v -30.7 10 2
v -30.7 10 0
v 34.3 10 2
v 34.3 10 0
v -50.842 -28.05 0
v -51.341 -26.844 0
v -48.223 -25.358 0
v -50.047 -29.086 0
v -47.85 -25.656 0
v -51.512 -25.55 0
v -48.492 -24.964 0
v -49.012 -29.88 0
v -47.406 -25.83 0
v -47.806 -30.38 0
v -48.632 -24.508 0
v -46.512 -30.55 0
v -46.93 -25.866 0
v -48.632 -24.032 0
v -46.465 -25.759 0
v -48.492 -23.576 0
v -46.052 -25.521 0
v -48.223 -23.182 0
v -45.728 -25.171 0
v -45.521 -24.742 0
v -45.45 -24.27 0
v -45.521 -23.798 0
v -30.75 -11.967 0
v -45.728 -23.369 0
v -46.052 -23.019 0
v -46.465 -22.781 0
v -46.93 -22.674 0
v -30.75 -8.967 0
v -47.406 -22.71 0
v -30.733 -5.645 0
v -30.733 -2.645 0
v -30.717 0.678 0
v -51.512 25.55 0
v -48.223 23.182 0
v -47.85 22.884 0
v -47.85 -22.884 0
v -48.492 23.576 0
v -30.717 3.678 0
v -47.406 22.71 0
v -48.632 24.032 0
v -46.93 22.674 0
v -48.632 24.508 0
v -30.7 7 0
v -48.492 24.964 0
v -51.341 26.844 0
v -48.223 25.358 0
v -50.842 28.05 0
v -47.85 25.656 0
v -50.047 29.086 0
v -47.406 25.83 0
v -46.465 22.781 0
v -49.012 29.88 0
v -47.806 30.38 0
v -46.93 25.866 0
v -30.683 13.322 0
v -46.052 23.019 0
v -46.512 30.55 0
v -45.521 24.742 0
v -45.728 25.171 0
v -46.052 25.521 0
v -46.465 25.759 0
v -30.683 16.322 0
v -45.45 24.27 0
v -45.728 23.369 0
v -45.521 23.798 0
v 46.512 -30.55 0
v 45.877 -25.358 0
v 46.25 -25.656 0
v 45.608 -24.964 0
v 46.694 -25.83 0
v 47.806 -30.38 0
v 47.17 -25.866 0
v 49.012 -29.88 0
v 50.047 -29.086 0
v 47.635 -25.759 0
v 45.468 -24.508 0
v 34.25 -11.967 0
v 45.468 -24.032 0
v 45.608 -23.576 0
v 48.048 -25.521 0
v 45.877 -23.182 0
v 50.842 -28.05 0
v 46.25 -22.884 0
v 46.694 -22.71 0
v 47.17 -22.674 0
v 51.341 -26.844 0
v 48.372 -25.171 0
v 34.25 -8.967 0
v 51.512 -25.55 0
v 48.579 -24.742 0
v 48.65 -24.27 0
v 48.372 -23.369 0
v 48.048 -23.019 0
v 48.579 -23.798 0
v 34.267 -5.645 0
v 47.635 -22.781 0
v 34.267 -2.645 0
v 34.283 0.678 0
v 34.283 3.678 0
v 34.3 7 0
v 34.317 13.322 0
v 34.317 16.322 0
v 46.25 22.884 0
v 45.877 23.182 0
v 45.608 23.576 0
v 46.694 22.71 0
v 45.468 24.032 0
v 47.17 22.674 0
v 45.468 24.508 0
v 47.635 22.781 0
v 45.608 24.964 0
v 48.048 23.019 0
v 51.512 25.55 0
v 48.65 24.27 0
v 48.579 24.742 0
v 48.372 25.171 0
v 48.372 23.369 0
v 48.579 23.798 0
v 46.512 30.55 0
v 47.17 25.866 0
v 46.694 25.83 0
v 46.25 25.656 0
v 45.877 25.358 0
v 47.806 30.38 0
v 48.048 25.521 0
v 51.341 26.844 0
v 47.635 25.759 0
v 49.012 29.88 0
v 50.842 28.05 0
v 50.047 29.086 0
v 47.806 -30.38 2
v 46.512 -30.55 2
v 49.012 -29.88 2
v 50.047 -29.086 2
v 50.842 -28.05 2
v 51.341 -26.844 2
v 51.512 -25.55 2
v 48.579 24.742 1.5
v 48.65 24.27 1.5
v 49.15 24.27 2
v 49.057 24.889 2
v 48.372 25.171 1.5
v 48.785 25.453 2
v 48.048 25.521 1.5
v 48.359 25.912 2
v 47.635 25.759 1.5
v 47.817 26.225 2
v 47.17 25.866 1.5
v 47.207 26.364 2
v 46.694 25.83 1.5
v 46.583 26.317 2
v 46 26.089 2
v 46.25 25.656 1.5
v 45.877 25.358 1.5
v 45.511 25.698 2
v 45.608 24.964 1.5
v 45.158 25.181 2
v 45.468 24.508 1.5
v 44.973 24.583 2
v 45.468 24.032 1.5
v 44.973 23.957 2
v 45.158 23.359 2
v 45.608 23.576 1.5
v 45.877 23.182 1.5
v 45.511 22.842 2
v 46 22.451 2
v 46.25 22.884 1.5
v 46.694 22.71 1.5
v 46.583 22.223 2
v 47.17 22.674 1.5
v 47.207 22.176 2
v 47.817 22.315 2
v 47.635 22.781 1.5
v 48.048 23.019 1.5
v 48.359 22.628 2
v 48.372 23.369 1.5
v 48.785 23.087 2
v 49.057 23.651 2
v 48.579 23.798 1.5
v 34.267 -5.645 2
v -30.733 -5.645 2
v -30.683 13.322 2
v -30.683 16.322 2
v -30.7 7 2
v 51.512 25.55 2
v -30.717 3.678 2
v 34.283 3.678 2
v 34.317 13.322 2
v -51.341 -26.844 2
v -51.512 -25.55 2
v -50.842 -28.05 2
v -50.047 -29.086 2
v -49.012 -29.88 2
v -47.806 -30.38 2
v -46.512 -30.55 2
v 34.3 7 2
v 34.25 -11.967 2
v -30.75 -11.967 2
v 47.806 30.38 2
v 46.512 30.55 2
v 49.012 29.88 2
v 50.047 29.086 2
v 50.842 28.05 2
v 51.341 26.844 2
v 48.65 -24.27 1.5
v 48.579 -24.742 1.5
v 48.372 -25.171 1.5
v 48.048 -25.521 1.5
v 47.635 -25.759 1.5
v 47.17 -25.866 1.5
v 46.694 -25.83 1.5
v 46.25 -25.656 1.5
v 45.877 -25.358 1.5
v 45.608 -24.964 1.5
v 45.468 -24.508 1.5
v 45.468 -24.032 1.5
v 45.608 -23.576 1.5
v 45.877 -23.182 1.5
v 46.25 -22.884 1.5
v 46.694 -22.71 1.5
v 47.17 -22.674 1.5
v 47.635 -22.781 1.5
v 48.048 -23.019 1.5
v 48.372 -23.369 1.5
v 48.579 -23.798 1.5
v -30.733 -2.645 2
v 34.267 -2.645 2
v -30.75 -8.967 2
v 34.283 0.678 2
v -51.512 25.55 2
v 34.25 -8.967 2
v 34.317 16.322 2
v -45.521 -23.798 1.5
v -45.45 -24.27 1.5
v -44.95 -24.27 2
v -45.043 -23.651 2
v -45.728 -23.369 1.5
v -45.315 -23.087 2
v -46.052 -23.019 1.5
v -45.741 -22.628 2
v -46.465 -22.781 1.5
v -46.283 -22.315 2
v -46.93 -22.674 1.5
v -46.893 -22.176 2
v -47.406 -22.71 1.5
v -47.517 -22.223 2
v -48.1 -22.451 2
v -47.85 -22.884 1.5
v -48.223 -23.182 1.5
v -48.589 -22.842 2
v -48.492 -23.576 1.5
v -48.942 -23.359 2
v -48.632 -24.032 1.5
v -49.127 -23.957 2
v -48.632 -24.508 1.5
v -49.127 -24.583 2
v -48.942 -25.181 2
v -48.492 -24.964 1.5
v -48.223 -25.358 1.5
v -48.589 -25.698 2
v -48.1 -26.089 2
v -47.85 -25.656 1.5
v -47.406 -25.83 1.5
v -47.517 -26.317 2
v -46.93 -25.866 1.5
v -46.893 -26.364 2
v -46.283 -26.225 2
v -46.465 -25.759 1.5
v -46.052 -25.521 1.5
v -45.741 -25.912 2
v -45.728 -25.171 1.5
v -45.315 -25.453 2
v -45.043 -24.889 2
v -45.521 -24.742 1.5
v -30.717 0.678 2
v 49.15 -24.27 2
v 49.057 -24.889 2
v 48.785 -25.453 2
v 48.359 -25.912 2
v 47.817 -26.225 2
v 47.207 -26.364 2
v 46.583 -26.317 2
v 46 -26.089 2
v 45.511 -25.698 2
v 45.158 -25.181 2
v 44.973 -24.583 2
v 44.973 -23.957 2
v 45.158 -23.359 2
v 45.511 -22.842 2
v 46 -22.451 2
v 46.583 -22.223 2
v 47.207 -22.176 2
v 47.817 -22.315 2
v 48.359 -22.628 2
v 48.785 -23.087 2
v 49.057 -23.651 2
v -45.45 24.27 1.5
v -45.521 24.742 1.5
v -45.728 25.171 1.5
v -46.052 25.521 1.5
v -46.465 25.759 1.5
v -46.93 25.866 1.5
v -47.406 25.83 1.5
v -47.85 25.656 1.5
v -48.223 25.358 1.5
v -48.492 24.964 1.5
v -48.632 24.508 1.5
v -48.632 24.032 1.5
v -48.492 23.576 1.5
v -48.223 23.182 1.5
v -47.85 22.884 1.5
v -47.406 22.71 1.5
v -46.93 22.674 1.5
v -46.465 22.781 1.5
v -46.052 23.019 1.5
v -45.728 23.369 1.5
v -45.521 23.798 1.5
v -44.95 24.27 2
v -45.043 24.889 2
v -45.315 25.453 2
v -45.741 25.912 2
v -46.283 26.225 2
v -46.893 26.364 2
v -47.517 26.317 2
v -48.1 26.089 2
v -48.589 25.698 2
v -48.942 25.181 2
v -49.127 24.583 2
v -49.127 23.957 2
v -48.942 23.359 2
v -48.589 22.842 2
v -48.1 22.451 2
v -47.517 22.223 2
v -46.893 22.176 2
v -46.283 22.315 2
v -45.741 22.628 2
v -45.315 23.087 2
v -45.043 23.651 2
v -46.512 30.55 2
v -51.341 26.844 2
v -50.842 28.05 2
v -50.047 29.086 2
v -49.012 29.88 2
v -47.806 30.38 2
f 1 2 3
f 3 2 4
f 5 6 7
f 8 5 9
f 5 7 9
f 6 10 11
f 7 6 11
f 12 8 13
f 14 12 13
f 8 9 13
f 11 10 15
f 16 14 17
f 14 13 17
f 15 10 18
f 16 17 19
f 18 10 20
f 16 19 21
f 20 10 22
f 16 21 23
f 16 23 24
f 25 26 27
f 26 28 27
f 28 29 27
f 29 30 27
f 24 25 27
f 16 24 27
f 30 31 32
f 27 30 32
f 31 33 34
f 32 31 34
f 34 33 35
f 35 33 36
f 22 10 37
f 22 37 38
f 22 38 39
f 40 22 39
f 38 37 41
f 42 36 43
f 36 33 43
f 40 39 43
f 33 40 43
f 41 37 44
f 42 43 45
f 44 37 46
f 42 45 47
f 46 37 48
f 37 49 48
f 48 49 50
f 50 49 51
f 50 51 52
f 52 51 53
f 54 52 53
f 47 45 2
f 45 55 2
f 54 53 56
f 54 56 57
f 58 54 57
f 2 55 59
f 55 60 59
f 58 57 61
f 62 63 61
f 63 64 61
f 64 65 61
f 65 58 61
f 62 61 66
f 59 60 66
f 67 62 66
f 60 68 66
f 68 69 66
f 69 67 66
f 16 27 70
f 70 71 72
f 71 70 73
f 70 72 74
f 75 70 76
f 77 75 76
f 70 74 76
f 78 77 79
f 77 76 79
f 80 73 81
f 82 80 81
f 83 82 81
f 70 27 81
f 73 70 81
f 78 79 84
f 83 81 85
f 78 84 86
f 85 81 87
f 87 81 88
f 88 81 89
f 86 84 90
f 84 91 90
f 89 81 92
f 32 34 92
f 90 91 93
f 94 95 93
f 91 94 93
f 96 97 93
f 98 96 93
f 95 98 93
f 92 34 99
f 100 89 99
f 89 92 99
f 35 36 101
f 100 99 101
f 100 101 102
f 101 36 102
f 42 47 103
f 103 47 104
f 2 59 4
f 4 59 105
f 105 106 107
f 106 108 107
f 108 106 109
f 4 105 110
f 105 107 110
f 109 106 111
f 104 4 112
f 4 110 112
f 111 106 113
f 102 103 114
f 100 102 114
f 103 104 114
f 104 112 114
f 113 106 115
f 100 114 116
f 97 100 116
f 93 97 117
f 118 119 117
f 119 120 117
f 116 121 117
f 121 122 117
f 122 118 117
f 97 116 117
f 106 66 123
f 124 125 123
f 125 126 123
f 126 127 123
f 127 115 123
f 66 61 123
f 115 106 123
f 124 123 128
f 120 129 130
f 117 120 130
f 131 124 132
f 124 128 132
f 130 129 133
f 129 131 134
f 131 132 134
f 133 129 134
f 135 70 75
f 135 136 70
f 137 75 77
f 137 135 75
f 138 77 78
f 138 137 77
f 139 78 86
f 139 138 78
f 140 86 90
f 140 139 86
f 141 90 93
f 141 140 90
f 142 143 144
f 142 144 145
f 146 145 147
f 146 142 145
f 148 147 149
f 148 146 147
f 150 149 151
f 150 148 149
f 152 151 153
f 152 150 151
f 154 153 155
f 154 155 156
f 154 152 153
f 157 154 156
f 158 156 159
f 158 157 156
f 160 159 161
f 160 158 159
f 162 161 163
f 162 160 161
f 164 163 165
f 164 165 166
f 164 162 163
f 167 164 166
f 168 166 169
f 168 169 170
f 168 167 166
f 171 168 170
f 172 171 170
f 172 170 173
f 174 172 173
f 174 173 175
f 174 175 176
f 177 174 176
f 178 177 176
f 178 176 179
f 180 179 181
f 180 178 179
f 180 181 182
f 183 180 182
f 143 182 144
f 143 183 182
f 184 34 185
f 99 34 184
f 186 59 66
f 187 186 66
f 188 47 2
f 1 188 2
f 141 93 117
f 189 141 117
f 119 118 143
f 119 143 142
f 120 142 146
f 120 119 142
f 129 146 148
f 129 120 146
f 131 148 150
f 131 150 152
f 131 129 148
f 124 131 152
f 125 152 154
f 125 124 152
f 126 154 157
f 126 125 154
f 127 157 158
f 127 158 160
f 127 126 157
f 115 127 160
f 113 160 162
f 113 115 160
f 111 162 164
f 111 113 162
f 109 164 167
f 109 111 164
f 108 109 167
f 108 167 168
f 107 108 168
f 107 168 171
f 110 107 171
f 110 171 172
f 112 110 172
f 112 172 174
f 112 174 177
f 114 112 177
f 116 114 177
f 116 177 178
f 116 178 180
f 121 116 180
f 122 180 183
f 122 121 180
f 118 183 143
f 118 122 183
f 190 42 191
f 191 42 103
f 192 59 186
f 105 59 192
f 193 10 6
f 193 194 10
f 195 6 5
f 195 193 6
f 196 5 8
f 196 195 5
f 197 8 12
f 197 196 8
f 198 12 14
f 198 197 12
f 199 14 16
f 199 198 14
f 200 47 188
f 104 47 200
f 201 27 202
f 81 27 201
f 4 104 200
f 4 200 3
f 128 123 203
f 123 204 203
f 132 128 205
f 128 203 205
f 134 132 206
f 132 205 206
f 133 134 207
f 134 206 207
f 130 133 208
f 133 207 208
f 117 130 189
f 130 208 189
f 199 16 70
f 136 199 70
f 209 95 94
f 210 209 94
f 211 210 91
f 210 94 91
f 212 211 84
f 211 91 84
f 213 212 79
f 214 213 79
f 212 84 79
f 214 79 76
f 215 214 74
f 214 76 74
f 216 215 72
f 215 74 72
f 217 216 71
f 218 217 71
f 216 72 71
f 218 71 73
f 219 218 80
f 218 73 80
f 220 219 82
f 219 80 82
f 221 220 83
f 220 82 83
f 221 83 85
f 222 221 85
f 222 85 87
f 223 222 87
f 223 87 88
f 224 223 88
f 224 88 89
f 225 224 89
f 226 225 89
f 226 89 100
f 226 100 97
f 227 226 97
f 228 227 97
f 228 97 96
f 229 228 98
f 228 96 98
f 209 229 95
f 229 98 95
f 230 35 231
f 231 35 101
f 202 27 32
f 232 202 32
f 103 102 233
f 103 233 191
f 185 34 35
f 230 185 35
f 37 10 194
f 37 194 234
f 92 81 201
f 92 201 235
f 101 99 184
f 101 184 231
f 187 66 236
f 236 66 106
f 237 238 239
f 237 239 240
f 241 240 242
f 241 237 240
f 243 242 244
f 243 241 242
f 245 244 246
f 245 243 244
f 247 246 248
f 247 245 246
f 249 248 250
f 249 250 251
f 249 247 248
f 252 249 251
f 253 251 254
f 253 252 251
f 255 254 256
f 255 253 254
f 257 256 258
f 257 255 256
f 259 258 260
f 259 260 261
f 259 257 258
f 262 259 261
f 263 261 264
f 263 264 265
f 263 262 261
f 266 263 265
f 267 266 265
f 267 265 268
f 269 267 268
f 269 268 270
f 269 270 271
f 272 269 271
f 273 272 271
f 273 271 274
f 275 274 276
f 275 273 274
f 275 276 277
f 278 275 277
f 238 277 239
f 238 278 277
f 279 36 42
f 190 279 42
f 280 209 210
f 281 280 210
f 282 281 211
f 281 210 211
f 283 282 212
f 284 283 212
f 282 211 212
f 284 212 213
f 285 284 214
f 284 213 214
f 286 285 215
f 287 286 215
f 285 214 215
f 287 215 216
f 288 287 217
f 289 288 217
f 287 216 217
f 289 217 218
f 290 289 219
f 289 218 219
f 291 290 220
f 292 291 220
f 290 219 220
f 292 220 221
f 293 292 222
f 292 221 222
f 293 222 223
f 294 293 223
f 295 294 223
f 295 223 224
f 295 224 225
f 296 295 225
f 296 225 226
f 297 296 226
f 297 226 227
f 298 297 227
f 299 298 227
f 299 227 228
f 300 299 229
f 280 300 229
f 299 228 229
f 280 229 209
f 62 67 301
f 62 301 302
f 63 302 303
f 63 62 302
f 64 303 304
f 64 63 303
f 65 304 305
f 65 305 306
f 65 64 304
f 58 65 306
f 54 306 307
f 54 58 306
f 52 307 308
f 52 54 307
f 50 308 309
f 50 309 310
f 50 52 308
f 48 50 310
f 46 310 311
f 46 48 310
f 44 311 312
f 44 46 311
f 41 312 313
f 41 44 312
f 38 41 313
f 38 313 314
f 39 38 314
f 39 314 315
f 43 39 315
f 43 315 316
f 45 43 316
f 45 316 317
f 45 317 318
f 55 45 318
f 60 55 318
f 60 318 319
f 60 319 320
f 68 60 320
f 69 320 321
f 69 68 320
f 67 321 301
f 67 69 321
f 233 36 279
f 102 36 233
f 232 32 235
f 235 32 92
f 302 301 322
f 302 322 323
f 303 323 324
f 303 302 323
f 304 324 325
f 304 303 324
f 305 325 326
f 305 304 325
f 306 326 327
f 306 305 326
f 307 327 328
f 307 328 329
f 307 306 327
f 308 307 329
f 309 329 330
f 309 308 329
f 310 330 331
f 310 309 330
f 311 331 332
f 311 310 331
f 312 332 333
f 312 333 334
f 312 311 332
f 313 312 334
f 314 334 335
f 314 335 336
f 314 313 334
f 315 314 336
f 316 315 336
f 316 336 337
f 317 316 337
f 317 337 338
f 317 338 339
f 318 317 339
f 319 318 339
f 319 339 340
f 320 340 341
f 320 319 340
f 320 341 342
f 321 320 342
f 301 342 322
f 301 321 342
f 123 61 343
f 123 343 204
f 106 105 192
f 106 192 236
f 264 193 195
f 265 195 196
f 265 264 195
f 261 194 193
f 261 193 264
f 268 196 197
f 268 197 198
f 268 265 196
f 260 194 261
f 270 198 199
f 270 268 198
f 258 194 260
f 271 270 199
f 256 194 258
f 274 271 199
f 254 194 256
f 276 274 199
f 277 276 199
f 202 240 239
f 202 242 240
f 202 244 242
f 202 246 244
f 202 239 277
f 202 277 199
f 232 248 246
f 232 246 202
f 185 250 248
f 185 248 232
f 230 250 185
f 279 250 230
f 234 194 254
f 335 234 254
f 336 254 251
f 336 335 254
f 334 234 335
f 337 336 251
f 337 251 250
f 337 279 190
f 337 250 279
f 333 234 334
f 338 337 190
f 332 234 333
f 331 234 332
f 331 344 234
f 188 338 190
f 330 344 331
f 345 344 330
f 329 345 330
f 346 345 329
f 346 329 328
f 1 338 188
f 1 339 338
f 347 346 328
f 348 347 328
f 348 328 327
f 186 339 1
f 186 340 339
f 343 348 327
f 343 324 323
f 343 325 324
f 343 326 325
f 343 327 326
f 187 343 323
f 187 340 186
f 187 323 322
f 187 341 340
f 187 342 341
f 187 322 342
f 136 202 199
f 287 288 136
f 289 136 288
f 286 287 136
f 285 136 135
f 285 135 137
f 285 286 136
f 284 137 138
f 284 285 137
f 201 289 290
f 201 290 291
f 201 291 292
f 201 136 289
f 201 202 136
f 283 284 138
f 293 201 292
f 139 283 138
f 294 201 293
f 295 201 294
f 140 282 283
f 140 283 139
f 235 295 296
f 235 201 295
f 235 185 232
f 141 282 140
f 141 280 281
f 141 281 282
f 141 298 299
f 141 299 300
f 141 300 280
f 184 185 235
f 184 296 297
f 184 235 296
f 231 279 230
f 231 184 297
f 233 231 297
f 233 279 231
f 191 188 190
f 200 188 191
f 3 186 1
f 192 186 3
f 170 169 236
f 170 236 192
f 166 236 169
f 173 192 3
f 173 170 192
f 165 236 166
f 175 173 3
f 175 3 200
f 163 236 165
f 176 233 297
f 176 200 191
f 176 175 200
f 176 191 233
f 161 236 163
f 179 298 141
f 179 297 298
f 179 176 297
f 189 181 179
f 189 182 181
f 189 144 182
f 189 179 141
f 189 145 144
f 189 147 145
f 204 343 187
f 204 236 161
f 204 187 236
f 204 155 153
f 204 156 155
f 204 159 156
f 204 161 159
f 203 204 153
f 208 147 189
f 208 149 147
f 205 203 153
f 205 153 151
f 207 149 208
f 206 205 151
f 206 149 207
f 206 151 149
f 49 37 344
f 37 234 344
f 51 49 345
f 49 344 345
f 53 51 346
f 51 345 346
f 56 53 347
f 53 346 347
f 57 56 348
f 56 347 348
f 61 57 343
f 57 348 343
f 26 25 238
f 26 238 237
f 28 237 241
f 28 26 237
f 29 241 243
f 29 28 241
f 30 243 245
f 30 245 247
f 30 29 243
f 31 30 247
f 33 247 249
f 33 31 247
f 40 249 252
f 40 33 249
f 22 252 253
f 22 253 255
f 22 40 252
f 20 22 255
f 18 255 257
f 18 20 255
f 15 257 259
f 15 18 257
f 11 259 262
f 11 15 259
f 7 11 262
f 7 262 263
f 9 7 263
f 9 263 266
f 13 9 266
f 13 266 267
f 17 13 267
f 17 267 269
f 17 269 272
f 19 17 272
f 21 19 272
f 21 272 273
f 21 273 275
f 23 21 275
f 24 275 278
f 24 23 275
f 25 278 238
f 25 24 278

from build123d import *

# Parameters (mm, degrees)
F0_W     = 103.023604
F0_H     = 61.1
F0_R     = 1.6
F0_W_2   = 65
F0_H_2   = 3
F1_DEPTH = 2
F2_R     = 5
F3_SIZE  = 0.5


with BuildPart() as f1:
    # F0 (on Top) → F1 (new body)
    with BuildSketch(Plane.XY):
        Rectangle(F0_W, F0_H)
        with Locations((-47.05, -24.27)):
            Circle(F0_R, mode=Mode.SUBTRACT)
        with BuildLine():
            ThreePointArc((45.45, -24.27), (47.05, -22.67), (48.65, -24.27))
            ThreePointArc((48.65, -24.27), (47.05, -25.87), (45.45, -24.27))
        make_face(mode=Mode.SUBTRACT)
        with Locations((1.75037, -10.466814)):
            Rectangle(F0_W_2, F0_H_2, mode=Mode.SUBTRACT)
        with Locations((1.766913, -4.144543)):
            Rectangle(F0_W_2, F0_H_2, mode=Mode.SUBTRACT)
        with Locations((-47.05, 24.27)):
            Circle(F0_R, mode=Mode.SUBTRACT)
        with Locations((1.783457, 2.177729)):
            Rectangle(F0_W_2, F0_H_2, mode=Mode.SUBTRACT)
        with Locations((1.8, 8.5)):
            Rectangle(F0_W_2, F0_H_2, mode=Mode.SUBTRACT)
        with Locations((1.816543, 14.822271)):
            Rectangle(F0_W_2, F0_H_2, mode=Mode.SUBTRACT)
        with Locations((47.05, 24.27)):
            Circle(F0_R, mode=Mode.SUBTRACT)
    extrude(amount=F1_DEPTH)

    # F2
    f2_edges = [f1.edges().sort_by_distance(p)[0] for p in [
        (-51.511802, -30.55, 1),
        (-51.511802, 30.55, 1),
        (51.511802, -30.55, 1),
        (51.511802, 30.55, 1),
    ]]
    fillet(f2_edges, radius=F2_R)

    # F3
    f3_edges = [f1.edges().sort_by_distance(p)[0] for p in [
        (-48.65, -24.27, 2),
        (-48.65, 24.27, 2),
        (45.45, 24.27, 2),
        (48.65, -24.27, 2),
    ]]
    chamfer(f3_edges, length=F3_SIZE)


solid = f1.part
